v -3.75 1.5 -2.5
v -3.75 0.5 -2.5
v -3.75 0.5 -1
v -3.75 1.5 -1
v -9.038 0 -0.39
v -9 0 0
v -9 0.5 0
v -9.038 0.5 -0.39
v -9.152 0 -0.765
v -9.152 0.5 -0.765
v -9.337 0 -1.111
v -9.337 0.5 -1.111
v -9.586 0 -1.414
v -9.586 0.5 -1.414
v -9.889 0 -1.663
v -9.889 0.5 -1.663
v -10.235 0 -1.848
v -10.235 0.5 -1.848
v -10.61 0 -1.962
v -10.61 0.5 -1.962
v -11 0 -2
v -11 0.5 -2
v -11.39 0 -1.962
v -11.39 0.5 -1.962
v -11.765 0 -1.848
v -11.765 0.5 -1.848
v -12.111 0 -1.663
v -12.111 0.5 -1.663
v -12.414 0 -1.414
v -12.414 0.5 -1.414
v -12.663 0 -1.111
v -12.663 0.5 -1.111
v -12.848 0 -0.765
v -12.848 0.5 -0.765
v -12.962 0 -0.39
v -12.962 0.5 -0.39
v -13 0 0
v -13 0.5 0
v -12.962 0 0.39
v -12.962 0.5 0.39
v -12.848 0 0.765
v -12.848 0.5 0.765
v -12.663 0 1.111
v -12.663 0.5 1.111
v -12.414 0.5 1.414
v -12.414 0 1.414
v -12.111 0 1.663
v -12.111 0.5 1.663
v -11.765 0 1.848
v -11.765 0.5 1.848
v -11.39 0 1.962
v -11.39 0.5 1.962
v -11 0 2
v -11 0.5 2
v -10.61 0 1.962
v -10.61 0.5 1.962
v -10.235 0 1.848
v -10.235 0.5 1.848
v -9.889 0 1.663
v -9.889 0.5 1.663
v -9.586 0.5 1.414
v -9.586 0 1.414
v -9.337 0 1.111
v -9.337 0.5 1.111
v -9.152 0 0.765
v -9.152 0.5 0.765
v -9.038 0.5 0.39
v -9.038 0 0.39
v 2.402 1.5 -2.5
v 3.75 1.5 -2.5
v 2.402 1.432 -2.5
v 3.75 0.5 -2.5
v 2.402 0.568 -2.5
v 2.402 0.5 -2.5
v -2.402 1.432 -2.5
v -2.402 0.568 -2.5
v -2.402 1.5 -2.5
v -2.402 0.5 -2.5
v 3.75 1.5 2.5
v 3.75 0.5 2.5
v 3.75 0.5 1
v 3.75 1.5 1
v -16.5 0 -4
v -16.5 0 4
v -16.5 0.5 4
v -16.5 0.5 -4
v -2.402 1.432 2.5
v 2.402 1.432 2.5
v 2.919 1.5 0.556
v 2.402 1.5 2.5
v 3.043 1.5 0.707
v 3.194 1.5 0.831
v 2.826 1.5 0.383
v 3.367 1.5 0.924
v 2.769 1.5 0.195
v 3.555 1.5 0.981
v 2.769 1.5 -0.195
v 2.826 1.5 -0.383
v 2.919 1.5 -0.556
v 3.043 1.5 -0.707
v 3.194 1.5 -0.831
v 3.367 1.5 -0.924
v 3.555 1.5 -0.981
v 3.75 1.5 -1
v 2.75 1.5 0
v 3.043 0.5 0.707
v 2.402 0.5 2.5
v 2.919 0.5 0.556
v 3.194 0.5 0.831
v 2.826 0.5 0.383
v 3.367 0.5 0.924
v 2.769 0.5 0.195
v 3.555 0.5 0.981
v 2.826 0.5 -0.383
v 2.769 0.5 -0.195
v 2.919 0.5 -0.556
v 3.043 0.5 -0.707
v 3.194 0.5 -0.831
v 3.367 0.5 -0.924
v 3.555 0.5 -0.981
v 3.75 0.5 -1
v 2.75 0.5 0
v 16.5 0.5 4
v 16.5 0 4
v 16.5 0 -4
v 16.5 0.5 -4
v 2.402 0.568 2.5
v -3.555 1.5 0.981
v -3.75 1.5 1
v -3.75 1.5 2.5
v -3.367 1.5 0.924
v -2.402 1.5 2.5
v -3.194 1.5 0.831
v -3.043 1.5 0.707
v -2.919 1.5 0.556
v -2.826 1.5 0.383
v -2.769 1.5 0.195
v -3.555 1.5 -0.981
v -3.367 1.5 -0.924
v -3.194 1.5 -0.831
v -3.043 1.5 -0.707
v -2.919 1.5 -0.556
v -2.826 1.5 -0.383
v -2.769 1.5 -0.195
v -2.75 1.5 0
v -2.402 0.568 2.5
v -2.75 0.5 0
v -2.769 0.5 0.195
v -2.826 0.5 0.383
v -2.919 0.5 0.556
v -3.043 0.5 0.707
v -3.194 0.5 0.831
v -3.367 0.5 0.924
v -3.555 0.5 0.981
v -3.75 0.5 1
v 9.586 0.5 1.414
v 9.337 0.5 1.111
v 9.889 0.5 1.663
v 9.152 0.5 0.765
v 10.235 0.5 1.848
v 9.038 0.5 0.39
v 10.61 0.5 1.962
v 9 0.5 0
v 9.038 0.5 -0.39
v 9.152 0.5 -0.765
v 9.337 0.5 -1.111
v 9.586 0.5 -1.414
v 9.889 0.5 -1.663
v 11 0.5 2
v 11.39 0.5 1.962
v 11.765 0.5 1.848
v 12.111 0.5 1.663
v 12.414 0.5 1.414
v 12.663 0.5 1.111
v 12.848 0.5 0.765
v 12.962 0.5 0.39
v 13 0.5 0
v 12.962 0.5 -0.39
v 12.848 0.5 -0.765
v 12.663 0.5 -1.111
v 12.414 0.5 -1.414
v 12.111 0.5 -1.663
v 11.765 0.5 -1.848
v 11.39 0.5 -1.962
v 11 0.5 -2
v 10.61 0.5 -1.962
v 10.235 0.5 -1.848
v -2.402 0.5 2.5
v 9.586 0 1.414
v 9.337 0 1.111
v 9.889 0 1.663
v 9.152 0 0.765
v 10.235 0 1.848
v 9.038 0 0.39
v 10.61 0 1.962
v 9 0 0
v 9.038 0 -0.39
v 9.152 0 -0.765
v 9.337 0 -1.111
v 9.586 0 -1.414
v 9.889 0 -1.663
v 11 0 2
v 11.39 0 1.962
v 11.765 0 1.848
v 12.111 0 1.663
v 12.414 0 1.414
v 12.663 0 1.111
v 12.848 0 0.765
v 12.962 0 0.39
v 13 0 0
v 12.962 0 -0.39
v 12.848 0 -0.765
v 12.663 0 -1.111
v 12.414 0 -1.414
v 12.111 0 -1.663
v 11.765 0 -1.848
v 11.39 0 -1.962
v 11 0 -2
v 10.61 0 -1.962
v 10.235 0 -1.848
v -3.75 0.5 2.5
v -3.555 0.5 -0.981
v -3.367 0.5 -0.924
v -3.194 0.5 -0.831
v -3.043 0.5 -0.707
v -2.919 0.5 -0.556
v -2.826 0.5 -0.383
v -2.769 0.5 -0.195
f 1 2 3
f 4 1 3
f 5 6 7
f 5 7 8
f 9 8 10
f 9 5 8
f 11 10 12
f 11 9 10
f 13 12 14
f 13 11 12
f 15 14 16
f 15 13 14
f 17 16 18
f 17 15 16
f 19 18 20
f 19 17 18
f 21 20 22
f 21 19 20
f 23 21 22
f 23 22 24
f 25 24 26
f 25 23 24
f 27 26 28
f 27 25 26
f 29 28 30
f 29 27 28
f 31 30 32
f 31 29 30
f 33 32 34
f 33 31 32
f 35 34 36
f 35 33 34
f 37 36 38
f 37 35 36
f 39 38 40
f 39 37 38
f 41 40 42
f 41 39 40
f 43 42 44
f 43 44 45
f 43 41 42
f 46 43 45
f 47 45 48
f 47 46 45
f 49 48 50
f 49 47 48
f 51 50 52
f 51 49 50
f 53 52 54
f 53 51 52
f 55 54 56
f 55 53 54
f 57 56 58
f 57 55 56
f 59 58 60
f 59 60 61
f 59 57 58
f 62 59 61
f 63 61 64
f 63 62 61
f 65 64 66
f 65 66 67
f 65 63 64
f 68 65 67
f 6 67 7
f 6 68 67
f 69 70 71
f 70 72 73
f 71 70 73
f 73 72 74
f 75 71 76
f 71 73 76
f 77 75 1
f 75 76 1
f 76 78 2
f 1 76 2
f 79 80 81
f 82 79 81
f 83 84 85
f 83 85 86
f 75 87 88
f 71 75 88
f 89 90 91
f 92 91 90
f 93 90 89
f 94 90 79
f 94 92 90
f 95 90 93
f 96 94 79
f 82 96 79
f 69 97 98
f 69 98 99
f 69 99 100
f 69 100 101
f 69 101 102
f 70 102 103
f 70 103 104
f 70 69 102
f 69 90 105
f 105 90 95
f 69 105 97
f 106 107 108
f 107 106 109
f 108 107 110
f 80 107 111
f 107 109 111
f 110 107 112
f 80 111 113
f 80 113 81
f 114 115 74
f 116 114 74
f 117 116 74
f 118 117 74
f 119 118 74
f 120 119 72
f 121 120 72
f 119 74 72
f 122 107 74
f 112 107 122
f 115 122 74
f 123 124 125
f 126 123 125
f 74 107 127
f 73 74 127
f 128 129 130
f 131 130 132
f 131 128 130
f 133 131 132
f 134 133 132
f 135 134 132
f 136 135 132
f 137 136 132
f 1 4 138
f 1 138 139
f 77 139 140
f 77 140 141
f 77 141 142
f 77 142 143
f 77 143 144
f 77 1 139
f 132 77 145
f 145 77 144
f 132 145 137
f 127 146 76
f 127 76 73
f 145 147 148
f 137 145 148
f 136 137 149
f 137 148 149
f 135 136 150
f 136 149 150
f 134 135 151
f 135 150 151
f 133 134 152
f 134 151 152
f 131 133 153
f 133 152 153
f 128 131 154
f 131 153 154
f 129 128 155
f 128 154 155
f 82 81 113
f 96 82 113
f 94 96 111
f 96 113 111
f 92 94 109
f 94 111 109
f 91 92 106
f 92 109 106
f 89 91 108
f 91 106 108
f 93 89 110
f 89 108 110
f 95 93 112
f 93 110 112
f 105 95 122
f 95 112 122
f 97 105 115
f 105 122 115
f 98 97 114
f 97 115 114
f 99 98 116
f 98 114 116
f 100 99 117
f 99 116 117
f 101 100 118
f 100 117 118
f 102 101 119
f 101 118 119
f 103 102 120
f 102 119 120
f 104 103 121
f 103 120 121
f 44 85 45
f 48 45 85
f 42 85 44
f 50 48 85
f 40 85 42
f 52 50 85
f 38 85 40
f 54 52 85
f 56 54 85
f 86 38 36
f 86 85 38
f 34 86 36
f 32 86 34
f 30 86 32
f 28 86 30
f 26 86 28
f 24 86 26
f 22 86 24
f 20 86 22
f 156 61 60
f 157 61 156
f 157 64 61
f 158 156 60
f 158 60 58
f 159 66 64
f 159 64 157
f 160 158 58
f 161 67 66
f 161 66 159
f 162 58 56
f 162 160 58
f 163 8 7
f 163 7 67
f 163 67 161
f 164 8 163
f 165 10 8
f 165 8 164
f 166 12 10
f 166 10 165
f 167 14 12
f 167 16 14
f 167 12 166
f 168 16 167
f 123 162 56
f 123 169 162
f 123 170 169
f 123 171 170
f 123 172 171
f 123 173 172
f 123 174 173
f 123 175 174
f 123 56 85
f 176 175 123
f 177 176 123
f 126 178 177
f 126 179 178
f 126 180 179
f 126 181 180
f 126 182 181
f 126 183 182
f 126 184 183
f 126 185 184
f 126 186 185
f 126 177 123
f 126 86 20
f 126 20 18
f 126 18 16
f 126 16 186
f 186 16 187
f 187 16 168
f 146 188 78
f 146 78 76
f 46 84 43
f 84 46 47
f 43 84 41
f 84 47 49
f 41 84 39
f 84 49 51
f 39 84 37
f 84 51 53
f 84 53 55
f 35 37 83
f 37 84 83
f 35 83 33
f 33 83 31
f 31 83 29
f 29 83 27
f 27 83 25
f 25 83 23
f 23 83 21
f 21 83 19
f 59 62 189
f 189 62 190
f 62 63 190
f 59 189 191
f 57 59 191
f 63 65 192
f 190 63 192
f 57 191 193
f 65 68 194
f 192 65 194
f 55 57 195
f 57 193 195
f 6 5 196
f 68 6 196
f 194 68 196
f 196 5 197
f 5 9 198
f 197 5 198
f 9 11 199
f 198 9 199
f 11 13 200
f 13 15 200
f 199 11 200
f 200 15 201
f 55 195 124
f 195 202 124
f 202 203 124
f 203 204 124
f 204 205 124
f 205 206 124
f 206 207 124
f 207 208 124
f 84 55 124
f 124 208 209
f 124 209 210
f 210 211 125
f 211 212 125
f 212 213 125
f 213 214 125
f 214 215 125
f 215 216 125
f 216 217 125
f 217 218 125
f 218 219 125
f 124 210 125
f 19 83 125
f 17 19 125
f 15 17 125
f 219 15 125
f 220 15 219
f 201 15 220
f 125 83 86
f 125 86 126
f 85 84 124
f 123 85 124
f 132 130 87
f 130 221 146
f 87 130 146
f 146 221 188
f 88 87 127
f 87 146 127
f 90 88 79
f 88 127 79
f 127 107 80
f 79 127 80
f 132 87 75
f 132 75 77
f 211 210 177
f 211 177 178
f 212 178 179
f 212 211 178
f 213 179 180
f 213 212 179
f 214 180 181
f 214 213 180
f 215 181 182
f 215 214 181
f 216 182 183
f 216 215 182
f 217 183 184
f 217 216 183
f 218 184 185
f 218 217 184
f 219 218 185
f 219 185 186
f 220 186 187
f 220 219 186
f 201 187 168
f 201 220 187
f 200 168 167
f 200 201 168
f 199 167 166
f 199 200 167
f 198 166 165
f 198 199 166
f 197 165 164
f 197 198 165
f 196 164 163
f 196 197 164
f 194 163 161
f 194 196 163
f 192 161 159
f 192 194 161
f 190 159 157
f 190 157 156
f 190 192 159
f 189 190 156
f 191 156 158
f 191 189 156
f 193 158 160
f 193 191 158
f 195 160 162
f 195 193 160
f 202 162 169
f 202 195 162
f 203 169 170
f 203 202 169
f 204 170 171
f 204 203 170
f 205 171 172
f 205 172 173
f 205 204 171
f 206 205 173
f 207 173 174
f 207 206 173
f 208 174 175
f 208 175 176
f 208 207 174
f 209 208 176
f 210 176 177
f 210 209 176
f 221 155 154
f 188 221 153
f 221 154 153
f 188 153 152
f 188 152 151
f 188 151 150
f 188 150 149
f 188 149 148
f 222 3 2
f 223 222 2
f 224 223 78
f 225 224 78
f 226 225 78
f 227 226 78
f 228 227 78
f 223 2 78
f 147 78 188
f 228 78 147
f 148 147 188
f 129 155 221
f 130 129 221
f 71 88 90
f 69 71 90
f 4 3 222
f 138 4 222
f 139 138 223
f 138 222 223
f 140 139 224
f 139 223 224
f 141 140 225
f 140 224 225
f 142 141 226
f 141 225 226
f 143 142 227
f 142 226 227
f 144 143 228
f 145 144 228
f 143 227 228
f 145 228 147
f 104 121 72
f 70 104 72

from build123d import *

# Parameters (mm, degrees)
SKETCH1_W           = 33
SKETCH1_H           = 8
SKETCH1_R           = 2
BOSS_EXTRUDE1_DEPTH = 0.5
BOSS_EXTRUDE2_DEPTH = 1
SKETCH4_W           = 4.803572116
SKETCH4_H           = 0.067925827
CUT_EXTRUDE1_DEPTH  = 7.5


with BuildPart() as part:
    # Sketch1 → Boss-Extrude1 (new body)
    with BuildSketch(Plane(origin=(0, 0, 0), x_dir=(1, 0, 0), z_dir=(0, 1, 0))):
        Rectangle(SKETCH1_W, SKETCH1_H)
        with Locations((-11, 0)):
            Circle(SKETCH1_R, mode=Mode.SUBTRACT)
        with Locations((11, 0)):
            Circle(SKETCH1_R, mode=Mode.SUBTRACT)
    extrude(amount=BOSS_EXTRUDE1_DEPTH)


with BuildPart() as body_2:
    # Sketch3 → Boss-Extrude2 (new body)
    with BuildSketch(Plane(origin=(0, 0.5, 0), x_dir=(1, 0, 0), z_dir=(0, 1, 0))):
        with BuildLine():
            Line((-3.75, -1), (-3.75, -2.5))
            Line((-3.75, -2.5), (3.75, -2.5))
            Line((3.75, -2.5), (3.75, -1))
            ThreePointArc((3.75, -1), (2.75, 0), (3.75, 1))
            Line((3.75, 1), (3.75, 2.5))
            Line((3.75, 2.5), (-3.75, 2.5))
            Line((-3.75, 2.5), (-3.75, 1))
            ThreePointArc((-3.75, 1), (-3.042893219, 0.707106781), (-2.75, 0))
            ThreePointArc((-2.75, 0), (-3.042893219, -0.707106781), (-3.75, -1))
        make_face()
    extrude(amount=BOSS_EXTRUDE2_DEPTH)

    # Sketch4 → Cut-Extrude1 (cut, through all)
    with BuildSketch(Plane.XY.offset(2.5)):
        with Locations((0, 1.466037087)):
            Rectangle(SKETCH4_W, SKETCH4_H)
        with Locations((0, 0.533962914)):
            Rectangle(SKETCH4_W, SKETCH4_H)
    extrude(amount=-CUT_EXTRUDE1_DEPTH, mode=Mode.SUBTRACT)


solid = Compound([part.part, body_2.part])
